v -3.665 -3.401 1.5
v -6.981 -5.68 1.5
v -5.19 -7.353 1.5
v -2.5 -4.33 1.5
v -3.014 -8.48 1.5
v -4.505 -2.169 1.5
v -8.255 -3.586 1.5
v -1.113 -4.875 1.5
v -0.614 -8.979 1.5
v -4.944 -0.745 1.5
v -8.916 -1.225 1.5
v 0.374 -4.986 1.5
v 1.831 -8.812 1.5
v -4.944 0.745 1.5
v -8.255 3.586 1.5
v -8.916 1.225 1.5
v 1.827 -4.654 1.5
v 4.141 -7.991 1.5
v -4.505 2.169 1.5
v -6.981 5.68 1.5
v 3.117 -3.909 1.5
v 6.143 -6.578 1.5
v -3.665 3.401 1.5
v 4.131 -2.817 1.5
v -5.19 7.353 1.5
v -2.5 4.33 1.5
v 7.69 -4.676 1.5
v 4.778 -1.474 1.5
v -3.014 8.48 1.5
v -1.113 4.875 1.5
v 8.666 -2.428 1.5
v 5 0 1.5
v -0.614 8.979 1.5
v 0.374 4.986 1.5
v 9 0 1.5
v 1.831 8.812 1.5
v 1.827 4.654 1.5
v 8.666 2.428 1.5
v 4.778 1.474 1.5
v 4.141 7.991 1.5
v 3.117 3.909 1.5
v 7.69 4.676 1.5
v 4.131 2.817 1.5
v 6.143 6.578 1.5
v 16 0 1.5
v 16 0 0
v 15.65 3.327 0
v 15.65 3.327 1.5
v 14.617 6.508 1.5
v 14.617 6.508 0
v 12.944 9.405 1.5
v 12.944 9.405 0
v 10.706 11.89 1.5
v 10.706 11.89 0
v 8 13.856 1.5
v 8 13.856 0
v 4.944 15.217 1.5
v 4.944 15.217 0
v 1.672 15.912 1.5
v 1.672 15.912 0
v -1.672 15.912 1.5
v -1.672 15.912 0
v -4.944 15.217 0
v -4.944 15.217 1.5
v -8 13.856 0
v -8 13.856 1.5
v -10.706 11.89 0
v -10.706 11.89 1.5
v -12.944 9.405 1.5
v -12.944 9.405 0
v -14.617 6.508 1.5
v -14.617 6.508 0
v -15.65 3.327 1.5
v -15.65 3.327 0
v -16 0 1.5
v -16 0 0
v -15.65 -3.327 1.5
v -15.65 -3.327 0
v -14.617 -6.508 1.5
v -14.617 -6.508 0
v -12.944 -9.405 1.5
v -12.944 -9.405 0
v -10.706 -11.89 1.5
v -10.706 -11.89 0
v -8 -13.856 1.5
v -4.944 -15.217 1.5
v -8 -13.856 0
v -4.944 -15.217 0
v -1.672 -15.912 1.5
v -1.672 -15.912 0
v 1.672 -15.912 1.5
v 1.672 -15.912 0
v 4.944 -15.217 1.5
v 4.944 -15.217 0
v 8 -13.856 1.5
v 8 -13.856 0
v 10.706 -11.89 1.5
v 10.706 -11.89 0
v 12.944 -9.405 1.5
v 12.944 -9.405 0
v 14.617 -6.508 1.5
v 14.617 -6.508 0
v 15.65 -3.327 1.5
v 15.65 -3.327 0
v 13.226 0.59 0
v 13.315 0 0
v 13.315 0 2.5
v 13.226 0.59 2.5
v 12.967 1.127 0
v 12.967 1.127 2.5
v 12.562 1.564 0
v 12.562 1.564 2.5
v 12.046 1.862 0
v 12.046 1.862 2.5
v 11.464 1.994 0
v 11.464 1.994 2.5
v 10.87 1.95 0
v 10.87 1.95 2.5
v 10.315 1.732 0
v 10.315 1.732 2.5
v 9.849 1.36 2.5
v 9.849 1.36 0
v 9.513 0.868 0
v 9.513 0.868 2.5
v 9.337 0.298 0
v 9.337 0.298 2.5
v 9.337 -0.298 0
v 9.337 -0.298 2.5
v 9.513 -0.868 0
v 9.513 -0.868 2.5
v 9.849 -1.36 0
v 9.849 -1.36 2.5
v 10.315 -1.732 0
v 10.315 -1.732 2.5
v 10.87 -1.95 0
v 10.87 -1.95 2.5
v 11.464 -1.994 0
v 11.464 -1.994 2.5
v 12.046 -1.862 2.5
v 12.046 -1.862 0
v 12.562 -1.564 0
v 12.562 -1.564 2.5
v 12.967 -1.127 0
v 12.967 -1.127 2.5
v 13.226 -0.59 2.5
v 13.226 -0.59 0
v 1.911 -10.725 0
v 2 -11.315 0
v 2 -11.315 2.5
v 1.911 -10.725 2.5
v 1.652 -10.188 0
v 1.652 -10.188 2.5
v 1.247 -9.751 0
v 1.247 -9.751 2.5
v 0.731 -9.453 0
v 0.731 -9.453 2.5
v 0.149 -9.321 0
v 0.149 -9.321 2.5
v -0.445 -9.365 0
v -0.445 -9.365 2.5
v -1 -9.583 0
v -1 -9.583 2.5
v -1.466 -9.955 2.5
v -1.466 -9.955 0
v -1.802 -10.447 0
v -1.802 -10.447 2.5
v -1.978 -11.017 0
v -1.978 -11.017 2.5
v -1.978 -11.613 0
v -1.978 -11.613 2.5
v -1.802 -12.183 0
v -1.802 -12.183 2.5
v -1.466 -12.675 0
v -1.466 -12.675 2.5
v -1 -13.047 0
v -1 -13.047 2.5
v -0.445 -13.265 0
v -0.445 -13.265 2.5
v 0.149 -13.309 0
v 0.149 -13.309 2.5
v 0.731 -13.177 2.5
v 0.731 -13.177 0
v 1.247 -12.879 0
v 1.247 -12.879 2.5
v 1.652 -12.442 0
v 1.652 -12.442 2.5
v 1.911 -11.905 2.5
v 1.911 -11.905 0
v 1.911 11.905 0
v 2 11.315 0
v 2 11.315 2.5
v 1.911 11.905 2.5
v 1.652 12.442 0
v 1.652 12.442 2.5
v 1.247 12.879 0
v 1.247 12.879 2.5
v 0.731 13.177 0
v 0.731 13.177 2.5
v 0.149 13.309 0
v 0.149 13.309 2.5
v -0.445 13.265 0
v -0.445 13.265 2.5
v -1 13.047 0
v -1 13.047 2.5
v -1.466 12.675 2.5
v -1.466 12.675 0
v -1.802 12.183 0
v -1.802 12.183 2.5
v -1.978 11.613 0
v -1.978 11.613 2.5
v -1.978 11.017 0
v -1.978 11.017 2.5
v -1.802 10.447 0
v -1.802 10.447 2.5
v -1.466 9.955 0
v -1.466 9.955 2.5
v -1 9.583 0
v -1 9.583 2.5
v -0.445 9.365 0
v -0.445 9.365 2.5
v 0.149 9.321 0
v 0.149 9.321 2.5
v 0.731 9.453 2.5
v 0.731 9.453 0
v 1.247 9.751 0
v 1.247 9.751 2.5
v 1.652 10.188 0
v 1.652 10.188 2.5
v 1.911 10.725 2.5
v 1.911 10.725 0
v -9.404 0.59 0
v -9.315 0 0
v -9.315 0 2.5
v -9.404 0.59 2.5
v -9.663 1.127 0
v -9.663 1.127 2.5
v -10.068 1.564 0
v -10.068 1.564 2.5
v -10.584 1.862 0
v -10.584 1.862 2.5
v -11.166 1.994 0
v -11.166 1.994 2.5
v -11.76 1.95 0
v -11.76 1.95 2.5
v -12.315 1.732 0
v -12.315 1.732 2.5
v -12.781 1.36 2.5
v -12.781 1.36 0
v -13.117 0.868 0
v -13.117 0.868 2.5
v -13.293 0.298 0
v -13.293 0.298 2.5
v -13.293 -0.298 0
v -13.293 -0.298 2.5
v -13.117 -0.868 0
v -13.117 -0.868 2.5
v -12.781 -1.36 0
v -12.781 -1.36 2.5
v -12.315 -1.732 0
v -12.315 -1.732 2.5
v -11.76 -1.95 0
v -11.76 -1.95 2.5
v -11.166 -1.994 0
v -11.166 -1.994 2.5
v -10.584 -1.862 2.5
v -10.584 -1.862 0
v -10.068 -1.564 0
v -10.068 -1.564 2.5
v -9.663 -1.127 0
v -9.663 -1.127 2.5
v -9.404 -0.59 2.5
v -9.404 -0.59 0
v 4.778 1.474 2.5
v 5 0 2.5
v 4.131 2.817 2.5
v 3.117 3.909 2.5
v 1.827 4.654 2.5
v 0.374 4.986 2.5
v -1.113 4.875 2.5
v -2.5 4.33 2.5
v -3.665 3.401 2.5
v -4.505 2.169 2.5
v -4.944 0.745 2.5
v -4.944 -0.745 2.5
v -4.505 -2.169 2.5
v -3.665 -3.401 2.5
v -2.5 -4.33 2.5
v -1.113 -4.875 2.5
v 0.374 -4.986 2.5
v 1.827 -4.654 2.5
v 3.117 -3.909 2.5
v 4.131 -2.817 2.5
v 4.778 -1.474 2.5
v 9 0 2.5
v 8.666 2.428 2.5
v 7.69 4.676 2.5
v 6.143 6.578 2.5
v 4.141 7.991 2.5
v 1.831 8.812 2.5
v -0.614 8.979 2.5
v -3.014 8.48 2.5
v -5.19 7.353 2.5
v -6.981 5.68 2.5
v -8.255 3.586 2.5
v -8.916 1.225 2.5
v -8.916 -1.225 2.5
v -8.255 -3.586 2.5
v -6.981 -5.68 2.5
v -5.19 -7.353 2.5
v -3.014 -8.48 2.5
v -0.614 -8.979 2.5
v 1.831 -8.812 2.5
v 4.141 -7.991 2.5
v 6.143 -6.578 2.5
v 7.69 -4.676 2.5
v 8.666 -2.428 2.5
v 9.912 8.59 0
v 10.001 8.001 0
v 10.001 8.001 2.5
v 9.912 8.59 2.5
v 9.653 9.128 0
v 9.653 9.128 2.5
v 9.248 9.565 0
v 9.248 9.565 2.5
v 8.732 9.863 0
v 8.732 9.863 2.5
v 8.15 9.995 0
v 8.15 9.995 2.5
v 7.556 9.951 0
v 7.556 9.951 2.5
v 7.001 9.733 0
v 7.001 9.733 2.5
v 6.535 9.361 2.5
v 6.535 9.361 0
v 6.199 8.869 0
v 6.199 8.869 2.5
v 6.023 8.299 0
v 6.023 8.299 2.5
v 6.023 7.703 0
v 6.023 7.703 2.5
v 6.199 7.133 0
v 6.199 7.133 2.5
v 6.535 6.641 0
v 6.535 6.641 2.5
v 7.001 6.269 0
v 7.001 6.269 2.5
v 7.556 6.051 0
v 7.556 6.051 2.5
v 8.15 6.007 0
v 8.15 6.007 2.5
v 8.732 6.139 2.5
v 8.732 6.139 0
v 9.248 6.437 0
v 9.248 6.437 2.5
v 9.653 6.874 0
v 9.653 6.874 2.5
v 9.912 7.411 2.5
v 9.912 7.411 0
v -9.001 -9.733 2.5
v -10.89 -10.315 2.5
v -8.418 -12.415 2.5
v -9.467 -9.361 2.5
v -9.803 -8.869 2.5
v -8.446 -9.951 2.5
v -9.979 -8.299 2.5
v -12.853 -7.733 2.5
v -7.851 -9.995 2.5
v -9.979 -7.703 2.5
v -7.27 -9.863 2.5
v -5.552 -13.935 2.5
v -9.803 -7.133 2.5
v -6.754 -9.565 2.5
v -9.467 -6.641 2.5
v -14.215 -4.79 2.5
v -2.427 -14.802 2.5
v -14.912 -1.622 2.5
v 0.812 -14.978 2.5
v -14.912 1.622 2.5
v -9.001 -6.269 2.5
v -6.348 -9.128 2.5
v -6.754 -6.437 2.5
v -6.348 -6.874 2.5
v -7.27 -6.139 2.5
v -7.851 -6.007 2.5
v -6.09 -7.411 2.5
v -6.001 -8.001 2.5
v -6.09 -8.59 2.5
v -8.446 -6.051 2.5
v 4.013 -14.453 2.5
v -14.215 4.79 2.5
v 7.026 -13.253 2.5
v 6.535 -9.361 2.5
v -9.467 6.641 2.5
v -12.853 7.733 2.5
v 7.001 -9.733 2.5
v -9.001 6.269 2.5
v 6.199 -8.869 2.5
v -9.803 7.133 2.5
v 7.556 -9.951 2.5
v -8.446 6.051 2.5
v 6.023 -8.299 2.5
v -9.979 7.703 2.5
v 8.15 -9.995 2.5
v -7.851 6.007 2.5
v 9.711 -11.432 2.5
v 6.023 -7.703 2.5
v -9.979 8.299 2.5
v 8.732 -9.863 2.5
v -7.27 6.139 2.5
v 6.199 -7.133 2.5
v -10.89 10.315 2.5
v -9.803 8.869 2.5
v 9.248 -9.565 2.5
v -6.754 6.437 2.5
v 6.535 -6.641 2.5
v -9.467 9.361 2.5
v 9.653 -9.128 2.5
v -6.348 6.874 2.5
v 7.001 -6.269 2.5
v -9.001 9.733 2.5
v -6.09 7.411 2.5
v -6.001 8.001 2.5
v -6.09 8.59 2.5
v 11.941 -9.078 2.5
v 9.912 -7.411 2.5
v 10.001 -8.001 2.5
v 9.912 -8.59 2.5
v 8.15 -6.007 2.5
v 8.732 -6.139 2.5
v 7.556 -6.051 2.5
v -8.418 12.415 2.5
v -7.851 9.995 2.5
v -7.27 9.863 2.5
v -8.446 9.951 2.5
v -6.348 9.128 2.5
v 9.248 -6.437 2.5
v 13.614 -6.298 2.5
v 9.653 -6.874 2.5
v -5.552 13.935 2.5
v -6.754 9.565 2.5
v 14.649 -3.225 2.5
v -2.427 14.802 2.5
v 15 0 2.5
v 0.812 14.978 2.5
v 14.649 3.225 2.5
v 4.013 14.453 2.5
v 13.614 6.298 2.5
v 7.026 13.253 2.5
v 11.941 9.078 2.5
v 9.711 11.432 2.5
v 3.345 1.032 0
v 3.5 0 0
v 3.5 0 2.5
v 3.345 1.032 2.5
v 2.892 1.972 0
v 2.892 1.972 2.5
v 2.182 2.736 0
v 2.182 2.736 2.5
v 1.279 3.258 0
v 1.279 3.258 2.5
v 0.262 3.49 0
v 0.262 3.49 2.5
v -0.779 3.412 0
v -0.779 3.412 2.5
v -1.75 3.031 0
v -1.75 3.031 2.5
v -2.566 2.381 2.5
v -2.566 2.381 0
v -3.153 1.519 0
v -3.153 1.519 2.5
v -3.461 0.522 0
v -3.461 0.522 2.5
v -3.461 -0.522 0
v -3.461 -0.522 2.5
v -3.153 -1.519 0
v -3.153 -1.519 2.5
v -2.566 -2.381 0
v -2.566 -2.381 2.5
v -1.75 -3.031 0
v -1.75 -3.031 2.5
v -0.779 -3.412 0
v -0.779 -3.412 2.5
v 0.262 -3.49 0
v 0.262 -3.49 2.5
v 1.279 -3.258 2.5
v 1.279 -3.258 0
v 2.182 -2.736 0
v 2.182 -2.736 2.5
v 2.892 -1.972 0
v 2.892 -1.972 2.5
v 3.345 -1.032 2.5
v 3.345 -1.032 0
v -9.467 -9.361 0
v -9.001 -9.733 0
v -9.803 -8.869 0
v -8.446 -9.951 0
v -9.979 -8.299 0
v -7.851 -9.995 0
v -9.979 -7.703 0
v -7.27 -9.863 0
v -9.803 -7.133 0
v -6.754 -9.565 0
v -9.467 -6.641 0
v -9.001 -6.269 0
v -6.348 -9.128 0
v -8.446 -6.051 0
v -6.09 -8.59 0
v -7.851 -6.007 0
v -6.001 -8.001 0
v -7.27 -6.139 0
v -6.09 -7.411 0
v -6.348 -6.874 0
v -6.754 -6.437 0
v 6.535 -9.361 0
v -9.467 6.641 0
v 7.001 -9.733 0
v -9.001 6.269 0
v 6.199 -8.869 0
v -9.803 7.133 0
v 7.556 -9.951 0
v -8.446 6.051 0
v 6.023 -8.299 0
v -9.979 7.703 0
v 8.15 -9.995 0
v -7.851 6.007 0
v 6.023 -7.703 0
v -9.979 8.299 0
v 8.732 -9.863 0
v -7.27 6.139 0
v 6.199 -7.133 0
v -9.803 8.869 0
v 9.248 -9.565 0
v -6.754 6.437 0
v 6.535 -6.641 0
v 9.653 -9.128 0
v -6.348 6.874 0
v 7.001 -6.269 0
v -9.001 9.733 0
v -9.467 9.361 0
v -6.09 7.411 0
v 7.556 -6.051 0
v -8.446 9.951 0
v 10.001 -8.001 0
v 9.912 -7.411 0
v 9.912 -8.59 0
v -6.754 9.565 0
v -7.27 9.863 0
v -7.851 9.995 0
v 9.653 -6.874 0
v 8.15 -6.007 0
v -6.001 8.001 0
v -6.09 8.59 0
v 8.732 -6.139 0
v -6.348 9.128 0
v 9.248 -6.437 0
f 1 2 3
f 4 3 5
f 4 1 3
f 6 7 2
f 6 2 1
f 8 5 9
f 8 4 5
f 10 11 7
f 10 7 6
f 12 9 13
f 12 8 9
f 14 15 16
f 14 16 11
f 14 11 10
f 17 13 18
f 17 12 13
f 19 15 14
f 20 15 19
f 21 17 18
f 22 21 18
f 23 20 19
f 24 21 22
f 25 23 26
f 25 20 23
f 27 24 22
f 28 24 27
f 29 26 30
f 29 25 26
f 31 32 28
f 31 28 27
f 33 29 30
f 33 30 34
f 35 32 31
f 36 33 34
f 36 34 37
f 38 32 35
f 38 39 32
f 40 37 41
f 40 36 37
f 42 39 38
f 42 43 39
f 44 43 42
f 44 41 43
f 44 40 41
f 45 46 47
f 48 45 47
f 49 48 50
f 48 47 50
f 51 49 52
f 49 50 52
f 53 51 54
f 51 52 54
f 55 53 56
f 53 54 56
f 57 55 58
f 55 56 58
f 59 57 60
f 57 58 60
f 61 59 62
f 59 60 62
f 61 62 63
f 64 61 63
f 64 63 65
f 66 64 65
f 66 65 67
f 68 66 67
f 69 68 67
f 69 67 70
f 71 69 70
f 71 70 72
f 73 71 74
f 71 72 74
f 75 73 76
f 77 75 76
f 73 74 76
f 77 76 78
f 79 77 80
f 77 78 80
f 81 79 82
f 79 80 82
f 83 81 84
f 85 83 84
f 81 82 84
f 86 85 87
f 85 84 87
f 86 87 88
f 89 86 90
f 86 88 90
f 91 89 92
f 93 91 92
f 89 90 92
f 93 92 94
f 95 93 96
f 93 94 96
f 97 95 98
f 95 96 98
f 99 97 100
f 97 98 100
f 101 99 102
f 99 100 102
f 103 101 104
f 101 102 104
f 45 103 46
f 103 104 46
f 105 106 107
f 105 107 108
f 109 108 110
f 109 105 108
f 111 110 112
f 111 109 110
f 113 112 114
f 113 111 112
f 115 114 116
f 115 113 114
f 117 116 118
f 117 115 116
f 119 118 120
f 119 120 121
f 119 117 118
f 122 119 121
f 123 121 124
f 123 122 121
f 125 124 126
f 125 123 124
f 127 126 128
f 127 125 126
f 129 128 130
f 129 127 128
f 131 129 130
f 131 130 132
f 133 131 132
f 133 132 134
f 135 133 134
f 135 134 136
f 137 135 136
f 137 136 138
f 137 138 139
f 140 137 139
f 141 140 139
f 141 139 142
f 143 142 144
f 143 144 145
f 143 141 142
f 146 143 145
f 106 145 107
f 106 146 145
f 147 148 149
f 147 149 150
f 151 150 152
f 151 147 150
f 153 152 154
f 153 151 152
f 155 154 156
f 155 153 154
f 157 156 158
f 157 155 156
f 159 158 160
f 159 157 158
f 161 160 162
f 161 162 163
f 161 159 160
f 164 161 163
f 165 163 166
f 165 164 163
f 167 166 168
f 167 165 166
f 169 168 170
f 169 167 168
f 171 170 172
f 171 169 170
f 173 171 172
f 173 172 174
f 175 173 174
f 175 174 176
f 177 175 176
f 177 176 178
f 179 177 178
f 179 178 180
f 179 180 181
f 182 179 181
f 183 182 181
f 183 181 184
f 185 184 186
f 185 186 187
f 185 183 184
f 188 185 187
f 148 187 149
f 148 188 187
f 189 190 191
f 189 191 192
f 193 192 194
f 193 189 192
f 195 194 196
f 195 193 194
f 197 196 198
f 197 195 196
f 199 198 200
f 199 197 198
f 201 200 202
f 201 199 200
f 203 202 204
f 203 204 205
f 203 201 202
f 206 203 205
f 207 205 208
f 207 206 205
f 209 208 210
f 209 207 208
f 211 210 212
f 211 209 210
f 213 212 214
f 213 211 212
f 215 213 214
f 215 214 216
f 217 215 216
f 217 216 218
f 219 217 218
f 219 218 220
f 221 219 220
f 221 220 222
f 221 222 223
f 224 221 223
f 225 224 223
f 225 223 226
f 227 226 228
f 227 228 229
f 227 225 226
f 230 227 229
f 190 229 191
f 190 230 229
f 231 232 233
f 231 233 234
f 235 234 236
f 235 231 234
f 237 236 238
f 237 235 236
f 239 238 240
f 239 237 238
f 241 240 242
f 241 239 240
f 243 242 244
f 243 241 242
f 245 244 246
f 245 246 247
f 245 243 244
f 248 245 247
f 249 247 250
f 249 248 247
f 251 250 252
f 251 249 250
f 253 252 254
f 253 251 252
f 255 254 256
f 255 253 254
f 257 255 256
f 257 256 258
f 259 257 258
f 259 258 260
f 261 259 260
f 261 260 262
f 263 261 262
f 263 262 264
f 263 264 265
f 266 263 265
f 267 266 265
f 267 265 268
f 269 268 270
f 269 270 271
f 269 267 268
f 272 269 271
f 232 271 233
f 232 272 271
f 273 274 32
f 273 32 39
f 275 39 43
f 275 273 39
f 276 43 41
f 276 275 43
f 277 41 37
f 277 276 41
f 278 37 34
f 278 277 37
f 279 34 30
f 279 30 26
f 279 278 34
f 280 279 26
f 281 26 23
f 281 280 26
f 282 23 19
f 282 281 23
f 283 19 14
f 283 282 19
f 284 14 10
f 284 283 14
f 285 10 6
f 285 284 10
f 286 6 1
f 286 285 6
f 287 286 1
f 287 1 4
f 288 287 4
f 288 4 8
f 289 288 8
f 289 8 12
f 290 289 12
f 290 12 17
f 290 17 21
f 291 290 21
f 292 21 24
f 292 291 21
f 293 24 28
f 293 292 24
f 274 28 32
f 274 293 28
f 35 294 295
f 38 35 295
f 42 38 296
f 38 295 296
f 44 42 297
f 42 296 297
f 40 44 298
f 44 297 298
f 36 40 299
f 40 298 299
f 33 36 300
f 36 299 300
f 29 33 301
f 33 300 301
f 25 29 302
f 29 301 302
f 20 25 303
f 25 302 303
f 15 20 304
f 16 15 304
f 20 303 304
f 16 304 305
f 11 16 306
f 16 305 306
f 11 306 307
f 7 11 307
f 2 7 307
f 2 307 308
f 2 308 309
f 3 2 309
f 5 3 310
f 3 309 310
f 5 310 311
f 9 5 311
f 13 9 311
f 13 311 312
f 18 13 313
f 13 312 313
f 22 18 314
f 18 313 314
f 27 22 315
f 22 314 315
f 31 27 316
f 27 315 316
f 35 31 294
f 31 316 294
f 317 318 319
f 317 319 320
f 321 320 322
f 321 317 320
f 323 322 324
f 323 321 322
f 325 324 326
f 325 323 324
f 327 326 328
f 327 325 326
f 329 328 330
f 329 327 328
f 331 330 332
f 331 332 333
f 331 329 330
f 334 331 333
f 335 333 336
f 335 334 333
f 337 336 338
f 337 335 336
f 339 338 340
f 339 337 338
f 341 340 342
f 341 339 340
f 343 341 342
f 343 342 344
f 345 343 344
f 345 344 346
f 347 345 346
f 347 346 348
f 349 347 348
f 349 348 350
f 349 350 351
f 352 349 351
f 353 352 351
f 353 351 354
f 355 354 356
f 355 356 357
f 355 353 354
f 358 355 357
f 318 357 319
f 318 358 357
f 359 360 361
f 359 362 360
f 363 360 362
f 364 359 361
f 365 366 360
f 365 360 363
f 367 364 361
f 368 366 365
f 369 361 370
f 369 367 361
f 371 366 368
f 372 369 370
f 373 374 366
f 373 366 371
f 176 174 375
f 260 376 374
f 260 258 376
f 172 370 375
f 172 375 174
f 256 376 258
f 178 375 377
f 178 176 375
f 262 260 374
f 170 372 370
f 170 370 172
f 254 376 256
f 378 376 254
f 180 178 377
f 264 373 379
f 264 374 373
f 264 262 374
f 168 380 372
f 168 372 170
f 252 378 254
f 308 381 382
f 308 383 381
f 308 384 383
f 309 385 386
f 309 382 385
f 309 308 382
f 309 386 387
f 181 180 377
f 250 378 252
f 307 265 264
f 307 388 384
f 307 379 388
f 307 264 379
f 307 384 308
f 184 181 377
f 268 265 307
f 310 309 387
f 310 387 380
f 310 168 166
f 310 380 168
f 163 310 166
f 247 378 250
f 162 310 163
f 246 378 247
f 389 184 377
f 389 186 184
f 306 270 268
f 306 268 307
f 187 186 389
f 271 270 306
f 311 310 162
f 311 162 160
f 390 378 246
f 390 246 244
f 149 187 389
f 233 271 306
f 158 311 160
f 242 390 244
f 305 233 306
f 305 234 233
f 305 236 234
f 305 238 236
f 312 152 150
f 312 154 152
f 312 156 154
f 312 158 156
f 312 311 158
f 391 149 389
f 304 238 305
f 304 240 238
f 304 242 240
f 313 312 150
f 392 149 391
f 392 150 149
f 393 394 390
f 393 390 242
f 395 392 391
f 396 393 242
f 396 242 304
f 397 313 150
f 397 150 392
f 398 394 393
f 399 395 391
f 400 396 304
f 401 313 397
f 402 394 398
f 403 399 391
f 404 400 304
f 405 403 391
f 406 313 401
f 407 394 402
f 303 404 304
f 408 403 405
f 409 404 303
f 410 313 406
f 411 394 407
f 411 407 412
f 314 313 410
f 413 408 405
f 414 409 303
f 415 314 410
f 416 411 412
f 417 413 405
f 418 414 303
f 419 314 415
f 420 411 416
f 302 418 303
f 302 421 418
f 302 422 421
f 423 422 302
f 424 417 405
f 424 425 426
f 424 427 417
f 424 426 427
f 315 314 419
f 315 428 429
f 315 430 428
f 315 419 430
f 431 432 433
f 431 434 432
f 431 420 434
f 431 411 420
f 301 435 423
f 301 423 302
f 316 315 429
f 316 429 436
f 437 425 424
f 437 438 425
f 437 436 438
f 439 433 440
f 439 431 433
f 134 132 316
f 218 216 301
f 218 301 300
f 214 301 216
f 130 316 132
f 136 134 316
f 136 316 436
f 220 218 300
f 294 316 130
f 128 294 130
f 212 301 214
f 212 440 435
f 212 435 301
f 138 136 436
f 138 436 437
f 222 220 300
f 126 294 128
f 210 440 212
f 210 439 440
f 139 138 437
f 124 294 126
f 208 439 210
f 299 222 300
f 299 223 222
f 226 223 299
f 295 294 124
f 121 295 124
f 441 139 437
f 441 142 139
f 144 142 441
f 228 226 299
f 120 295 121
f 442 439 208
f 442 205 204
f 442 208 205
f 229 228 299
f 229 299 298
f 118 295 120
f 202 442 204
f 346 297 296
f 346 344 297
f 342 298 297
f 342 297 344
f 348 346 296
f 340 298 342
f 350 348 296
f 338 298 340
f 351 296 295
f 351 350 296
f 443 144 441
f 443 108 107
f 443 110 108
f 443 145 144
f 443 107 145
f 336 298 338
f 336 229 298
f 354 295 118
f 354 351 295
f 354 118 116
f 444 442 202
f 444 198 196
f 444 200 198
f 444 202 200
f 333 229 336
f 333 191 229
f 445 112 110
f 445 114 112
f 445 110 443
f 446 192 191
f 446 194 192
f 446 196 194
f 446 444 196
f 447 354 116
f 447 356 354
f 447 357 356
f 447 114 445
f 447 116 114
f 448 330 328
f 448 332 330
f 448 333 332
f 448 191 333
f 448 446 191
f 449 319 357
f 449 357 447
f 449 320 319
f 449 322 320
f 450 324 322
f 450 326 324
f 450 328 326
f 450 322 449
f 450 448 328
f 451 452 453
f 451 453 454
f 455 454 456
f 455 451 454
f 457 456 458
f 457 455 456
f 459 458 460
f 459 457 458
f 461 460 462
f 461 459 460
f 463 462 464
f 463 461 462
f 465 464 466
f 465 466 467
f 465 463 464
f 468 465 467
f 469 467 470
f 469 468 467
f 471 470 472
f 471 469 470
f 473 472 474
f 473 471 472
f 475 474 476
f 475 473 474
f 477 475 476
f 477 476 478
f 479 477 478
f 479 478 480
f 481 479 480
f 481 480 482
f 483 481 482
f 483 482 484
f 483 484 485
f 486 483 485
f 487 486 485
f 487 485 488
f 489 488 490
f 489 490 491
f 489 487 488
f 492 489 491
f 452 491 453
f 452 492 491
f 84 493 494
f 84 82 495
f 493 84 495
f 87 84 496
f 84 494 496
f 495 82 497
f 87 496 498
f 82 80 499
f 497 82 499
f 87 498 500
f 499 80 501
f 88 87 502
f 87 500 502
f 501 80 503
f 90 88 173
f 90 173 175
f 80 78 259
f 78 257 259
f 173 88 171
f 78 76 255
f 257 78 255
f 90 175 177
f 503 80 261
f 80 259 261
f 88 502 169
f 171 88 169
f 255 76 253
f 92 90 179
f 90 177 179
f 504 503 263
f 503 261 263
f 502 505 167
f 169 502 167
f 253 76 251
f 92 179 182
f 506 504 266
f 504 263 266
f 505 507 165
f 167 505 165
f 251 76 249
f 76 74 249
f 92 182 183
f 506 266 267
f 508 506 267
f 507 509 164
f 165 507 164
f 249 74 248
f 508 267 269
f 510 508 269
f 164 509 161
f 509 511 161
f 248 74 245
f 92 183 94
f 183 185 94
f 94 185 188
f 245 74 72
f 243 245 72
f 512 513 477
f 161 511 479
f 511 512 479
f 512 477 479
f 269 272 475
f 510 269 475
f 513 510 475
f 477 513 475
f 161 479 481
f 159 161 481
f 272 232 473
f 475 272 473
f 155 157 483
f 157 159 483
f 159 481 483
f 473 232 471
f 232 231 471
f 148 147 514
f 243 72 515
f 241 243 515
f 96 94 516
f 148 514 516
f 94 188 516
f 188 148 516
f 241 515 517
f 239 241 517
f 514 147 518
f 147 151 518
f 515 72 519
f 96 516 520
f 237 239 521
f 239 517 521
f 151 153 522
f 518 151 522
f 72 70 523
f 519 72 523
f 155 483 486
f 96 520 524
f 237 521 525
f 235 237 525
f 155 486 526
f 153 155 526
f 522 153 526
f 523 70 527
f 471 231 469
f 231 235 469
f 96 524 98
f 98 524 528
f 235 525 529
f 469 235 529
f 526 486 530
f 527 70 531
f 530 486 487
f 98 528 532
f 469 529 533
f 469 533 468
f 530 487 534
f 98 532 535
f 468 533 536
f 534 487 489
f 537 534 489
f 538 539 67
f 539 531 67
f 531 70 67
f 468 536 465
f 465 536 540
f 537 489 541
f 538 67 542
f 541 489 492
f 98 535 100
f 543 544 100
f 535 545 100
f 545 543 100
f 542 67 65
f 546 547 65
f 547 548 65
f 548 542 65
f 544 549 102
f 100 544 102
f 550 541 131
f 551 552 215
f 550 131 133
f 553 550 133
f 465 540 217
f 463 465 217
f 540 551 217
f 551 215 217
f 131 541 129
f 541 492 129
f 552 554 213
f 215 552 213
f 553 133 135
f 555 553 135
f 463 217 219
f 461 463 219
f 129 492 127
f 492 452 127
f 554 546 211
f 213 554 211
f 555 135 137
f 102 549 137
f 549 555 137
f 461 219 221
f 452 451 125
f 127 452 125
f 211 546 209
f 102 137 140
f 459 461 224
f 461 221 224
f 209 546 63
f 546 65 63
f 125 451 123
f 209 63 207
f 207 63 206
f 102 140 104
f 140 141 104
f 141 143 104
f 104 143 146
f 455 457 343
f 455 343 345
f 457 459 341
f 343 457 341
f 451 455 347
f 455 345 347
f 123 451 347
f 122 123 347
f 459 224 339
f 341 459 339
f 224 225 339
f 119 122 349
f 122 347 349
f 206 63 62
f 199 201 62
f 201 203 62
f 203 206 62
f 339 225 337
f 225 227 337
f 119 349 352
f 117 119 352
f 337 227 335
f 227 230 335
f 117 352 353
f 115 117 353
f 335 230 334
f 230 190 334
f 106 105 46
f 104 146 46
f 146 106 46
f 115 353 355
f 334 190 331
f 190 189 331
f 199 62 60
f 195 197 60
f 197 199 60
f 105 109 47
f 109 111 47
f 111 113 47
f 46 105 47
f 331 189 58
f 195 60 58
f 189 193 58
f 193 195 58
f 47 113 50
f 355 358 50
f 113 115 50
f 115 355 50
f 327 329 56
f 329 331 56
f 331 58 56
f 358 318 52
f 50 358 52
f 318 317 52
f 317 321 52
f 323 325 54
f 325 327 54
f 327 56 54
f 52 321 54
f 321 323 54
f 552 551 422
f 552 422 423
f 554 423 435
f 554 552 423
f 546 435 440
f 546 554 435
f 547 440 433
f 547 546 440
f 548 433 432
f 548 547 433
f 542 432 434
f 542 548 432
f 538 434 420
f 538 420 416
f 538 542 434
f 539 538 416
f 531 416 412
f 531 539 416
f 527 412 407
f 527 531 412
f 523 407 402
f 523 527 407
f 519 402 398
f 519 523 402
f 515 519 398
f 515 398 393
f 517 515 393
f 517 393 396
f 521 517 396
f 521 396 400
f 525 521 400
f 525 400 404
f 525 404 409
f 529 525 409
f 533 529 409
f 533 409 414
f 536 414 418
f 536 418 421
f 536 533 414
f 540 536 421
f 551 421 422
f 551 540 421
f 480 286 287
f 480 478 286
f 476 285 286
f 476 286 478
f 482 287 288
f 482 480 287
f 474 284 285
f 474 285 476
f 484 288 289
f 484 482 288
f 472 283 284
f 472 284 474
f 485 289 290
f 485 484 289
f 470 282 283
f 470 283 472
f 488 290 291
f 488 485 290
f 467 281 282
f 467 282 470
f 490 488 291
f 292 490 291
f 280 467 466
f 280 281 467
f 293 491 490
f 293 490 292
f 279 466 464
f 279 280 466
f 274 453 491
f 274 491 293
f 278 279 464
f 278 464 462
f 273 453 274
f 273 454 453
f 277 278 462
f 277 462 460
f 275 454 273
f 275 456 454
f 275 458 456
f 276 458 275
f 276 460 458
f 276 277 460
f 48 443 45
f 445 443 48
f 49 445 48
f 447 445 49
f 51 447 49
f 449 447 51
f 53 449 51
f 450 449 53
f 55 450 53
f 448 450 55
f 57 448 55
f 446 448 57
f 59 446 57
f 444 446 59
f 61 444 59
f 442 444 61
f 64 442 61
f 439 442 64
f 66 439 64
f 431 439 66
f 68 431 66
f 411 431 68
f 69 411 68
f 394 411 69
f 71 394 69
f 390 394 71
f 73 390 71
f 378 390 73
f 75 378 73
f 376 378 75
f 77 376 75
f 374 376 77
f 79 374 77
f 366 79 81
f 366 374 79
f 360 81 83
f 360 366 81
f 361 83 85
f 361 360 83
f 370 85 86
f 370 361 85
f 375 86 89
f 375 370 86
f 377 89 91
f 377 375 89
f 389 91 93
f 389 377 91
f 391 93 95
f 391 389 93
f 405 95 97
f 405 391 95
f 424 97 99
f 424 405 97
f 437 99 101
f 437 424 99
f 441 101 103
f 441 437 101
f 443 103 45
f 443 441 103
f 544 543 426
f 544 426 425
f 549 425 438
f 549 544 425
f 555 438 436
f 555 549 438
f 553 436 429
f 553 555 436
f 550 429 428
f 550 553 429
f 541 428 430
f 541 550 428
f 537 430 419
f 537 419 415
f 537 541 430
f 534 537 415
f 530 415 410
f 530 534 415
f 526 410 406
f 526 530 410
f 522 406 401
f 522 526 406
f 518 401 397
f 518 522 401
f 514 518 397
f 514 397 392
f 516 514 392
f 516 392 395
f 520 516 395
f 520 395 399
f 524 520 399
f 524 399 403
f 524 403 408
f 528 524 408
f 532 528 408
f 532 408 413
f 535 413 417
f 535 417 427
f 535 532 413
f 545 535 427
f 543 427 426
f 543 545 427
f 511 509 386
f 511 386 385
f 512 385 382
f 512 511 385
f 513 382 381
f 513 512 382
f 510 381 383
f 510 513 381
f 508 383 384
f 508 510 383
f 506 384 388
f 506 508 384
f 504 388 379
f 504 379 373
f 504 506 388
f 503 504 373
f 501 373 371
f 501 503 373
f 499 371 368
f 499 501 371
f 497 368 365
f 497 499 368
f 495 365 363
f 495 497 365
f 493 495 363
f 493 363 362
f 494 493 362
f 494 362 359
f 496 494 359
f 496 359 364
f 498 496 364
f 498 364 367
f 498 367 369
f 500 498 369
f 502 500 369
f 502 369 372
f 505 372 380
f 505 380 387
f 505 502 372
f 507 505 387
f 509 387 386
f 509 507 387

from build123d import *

# Parameters (mm, degrees)
SKETCH1_R           = 16
SKETCH1_R_2         = 2
SKETCH1_R_3         = 3.5
BOSS_EXTRUDE1_DEPTH = 2.5
SKETCH2_R           = 9
SKETCH2_R_2         = 5
CUT_EXTRUDE1_DEPTH  = 1
CHAMFER1_SIZE       = 1


with BuildPart() as part:
    # Sketch1 → Boss-Extrude1 (new body)
    with BuildSketch(Plane.XY):
        Circle(SKETCH1_R)
        with Locations((0, 11.315)):
            Circle(SKETCH1_R_2, mode=Mode.SUBTRACT)
        with Locations((8.000913229, 8.000913229)):
            Circle(SKETCH1_R_2, mode=Mode.SUBTRACT)
        with Locations((11.315, 0)):
            Circle(SKETCH1_R_2, mode=Mode.SUBTRACT)
        with Locations((8.000913229, -8.000913229)):
            Circle(SKETCH1_R_2, mode=Mode.SUBTRACT)
        with Locations((0, -11.315)):
            Circle(SKETCH1_R_2, mode=Mode.SUBTRACT)
        with Locations((-8.000913229, -8.000913229)):
            Circle(SKETCH1_R_2, mode=Mode.SUBTRACT)
        with Locations((-11.315, 0)):
            Circle(SKETCH1_R_2, mode=Mode.SUBTRACT)
        with Locations((-8.000913229, 8.000913229)):
            Circle(SKETCH1_R_2, mode=Mode.SUBTRACT)
        Circle(SKETCH1_R_3, mode=Mode.SUBTRACT)
    extrude(amount=BOSS_EXTRUDE1_DEPTH)

    # Sketch2 → Cut-Extrude1 (cut)
    with BuildSketch(Plane.XY.offset(2.5)):
        Circle(SKETCH2_R)
        Circle(SKETCH2_R_2, mode=Mode.SUBTRACT)
    extrude(amount=-CUT_EXTRUDE1_DEPTH, mode=Mode.SUBTRACT)

    # Chamfer1
    chamfer1_edges = [part.edges().sort_by_distance(p)[0] for p in [
        (-16, 0, 2.5),
    ]]
    chamfer(chamfer1_edges, length=CHAMFER1_SIZE)


solid = part.part
